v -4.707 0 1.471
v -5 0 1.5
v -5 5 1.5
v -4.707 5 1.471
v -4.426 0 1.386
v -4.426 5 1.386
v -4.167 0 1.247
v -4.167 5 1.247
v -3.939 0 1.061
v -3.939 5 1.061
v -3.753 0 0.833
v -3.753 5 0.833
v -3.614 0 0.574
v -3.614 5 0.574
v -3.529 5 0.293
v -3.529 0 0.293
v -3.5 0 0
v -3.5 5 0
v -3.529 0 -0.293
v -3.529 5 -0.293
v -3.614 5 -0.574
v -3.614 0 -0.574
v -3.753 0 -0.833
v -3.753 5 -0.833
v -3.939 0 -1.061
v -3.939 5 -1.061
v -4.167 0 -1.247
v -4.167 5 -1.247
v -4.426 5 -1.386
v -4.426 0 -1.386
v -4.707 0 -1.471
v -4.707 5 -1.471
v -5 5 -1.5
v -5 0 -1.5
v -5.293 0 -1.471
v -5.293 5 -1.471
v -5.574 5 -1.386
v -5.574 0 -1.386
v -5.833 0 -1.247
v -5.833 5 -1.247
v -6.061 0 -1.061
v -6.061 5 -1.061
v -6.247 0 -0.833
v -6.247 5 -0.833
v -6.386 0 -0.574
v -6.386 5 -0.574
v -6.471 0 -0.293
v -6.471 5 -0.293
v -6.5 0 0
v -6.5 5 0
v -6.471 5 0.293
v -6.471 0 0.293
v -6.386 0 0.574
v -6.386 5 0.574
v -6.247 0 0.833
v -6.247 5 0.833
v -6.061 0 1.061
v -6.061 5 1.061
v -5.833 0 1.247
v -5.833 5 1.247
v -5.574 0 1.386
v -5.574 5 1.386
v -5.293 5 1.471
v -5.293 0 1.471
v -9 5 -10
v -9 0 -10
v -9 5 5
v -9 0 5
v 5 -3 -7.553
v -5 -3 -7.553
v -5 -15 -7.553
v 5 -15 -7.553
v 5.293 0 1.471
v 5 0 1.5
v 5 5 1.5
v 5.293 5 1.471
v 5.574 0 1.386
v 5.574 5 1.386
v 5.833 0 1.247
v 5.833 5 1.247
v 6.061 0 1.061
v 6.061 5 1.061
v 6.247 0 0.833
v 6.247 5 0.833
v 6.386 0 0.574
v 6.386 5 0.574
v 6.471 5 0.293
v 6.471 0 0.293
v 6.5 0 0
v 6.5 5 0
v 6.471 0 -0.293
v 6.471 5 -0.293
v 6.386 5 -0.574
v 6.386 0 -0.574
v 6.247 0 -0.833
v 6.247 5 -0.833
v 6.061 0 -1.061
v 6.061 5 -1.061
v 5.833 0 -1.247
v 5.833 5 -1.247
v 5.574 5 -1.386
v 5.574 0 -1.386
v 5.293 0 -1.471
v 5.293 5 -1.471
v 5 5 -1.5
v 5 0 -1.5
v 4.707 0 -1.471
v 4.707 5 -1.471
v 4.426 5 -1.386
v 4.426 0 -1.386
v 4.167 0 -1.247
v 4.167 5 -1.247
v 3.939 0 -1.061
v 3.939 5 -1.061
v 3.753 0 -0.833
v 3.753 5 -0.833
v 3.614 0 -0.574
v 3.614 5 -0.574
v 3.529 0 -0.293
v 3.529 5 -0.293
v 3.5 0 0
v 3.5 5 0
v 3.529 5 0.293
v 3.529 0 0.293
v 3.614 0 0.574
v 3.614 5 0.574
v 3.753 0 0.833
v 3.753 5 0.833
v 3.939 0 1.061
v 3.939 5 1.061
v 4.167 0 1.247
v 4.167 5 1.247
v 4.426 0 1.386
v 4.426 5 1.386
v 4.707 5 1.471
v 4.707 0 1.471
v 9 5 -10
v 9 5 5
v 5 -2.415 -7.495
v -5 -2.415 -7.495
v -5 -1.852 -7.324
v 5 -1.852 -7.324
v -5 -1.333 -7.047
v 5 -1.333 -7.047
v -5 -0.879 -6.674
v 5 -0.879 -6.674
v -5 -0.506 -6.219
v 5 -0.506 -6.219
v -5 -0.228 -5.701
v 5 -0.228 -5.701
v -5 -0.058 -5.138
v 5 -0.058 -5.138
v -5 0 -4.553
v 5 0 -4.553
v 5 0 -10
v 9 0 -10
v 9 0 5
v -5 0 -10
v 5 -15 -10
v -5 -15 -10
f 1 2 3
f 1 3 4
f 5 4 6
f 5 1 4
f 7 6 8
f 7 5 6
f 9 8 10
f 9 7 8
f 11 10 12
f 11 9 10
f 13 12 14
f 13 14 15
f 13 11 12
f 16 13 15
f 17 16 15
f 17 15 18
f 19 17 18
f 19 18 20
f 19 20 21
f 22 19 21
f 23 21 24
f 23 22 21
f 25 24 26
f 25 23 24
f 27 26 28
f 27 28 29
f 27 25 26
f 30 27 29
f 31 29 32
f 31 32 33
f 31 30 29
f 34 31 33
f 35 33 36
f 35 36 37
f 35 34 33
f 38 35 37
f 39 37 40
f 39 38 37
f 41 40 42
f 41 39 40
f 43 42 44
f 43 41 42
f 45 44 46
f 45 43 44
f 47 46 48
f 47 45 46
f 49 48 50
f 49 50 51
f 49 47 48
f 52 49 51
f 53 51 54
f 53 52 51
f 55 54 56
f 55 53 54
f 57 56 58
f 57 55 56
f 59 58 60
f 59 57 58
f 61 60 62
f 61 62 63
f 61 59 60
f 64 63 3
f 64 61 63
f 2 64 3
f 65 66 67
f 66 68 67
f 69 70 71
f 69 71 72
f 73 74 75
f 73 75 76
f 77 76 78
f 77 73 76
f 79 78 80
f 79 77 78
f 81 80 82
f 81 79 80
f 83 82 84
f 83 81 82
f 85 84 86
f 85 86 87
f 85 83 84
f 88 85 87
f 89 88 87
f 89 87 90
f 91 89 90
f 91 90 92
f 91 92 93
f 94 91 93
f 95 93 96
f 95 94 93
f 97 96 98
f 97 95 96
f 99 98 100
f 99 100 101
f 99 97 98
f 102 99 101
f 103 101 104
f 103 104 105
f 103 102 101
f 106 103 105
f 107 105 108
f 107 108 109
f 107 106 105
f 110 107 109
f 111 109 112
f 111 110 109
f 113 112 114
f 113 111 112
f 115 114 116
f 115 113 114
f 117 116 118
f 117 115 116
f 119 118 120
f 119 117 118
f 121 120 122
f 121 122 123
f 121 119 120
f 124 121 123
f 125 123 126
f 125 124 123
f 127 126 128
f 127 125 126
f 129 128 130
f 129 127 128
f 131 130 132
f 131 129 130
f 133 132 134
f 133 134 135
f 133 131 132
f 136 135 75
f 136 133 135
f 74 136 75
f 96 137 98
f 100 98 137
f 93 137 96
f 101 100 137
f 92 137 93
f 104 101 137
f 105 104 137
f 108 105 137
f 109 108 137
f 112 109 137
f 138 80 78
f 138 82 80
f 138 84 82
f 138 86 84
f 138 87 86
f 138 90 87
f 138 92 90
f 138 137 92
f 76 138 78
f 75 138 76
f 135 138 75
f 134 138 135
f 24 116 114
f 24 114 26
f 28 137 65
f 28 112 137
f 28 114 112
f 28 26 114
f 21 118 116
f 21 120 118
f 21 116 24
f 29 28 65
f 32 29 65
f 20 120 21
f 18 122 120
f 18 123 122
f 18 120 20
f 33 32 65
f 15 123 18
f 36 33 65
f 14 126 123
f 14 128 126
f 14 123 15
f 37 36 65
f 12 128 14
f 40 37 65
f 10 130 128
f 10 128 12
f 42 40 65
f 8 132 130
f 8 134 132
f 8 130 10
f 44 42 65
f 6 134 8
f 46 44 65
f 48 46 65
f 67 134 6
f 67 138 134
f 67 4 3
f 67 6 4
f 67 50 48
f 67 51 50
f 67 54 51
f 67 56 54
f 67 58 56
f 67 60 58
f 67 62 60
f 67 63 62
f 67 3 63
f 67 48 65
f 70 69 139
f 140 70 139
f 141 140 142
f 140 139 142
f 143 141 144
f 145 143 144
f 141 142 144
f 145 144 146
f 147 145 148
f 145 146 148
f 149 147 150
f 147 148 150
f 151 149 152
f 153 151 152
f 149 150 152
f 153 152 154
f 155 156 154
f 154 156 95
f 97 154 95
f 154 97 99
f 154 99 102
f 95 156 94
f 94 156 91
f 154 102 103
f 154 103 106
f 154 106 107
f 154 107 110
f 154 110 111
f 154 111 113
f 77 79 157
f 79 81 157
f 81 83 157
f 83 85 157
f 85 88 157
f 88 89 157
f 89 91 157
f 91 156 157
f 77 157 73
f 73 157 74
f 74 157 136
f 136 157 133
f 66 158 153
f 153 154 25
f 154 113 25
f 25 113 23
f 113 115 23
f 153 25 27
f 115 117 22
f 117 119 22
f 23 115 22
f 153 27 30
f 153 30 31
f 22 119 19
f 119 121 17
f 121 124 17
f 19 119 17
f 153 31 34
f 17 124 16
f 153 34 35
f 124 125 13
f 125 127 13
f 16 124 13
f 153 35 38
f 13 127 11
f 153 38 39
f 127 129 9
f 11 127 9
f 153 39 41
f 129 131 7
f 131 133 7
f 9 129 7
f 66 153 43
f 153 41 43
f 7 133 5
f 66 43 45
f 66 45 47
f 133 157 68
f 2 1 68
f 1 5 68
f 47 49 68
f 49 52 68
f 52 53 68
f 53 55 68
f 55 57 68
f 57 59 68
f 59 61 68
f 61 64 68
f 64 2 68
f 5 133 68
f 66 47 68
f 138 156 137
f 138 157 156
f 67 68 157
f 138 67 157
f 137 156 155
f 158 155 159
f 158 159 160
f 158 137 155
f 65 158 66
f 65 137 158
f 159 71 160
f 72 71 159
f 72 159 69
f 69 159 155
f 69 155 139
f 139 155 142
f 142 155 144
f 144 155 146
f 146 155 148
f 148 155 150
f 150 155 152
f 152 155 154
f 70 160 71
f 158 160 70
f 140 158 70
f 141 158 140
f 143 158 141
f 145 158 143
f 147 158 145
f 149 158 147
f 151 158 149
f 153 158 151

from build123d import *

# Parameters (mm, degrees)
SKETCH1_W           = 18
SKETCH1_H           = 10
SKETCH1_R           = 1.5
BOSS_EXTRUDE1_DEPTH = 5
SKETCH2_W           = 18
SKETCH2_H           = 5
BOSS_EXTRUDE2_DEPTH = 5
SKETCH3_W           = 10
SKETCH3_H           = 2.44730383
BOSS_EXTRUDE3_DEPTH = 15
BOSS_EXTRUDE5_DEPTH = 10


with BuildPart() as part:
    # Sketch1 → Boss-Extrude1 (new body)
    with BuildSketch(Plane(origin=(0, 0, 0), x_dir=(1, 0, 0), z_dir=(0, 1, 0))):
        Rectangle(SKETCH1_W, SKETCH1_H)
        with Locations(Location((-5, 0, 0), (0, 0, 270))):
            Circle(SKETCH1_R, mode=Mode.SUBTRACT)
        with Locations(Location((5, 0, 0), (0, 0, 270))):
            Circle(SKETCH1_R, mode=Mode.SUBTRACT)
    extrude(amount=BOSS_EXTRUDE1_DEPTH)

    # Sketch2 → Boss-Extrude2 (add)
    with BuildSketch(Plane(origin=(0, 0, -5), x_dir=(-1, 0, 0), z_dir=(0, 0, -1))):
        with Locations((0, 2.5)):
            Rectangle(SKETCH2_W, SKETCH2_H)
    extrude(amount=BOSS_EXTRUDE2_DEPTH)

    # Sketch3 → Boss-Extrude3 (add)
    with BuildSketch(Plane.XZ):
        with Locations((0, -8.776348085)):
            Rectangle(SKETCH3_W, SKETCH3_H)
    extrude(amount=BOSS_EXTRUDE3_DEPTH)

    # Sketch4 → Boss-Extrude5 (add)
    with BuildSketch(Plane(origin=(5, 0, 0), x_dir=(0, 0, -1), z_dir=(1, 0, 0))):
        with BuildLine():
            Line((4.55269617, 0), (7.55269617, 0))
            Line((7.55269617, 0), (7.55269617, -3))
            ThreePointArc((7.55269617, -3), (6.674016513, -0.878679656), (4.55269617, 0))
        make_face()
    extrude(amount=-BOSS_EXTRUDE5_DEPTH)


solid = part.part
